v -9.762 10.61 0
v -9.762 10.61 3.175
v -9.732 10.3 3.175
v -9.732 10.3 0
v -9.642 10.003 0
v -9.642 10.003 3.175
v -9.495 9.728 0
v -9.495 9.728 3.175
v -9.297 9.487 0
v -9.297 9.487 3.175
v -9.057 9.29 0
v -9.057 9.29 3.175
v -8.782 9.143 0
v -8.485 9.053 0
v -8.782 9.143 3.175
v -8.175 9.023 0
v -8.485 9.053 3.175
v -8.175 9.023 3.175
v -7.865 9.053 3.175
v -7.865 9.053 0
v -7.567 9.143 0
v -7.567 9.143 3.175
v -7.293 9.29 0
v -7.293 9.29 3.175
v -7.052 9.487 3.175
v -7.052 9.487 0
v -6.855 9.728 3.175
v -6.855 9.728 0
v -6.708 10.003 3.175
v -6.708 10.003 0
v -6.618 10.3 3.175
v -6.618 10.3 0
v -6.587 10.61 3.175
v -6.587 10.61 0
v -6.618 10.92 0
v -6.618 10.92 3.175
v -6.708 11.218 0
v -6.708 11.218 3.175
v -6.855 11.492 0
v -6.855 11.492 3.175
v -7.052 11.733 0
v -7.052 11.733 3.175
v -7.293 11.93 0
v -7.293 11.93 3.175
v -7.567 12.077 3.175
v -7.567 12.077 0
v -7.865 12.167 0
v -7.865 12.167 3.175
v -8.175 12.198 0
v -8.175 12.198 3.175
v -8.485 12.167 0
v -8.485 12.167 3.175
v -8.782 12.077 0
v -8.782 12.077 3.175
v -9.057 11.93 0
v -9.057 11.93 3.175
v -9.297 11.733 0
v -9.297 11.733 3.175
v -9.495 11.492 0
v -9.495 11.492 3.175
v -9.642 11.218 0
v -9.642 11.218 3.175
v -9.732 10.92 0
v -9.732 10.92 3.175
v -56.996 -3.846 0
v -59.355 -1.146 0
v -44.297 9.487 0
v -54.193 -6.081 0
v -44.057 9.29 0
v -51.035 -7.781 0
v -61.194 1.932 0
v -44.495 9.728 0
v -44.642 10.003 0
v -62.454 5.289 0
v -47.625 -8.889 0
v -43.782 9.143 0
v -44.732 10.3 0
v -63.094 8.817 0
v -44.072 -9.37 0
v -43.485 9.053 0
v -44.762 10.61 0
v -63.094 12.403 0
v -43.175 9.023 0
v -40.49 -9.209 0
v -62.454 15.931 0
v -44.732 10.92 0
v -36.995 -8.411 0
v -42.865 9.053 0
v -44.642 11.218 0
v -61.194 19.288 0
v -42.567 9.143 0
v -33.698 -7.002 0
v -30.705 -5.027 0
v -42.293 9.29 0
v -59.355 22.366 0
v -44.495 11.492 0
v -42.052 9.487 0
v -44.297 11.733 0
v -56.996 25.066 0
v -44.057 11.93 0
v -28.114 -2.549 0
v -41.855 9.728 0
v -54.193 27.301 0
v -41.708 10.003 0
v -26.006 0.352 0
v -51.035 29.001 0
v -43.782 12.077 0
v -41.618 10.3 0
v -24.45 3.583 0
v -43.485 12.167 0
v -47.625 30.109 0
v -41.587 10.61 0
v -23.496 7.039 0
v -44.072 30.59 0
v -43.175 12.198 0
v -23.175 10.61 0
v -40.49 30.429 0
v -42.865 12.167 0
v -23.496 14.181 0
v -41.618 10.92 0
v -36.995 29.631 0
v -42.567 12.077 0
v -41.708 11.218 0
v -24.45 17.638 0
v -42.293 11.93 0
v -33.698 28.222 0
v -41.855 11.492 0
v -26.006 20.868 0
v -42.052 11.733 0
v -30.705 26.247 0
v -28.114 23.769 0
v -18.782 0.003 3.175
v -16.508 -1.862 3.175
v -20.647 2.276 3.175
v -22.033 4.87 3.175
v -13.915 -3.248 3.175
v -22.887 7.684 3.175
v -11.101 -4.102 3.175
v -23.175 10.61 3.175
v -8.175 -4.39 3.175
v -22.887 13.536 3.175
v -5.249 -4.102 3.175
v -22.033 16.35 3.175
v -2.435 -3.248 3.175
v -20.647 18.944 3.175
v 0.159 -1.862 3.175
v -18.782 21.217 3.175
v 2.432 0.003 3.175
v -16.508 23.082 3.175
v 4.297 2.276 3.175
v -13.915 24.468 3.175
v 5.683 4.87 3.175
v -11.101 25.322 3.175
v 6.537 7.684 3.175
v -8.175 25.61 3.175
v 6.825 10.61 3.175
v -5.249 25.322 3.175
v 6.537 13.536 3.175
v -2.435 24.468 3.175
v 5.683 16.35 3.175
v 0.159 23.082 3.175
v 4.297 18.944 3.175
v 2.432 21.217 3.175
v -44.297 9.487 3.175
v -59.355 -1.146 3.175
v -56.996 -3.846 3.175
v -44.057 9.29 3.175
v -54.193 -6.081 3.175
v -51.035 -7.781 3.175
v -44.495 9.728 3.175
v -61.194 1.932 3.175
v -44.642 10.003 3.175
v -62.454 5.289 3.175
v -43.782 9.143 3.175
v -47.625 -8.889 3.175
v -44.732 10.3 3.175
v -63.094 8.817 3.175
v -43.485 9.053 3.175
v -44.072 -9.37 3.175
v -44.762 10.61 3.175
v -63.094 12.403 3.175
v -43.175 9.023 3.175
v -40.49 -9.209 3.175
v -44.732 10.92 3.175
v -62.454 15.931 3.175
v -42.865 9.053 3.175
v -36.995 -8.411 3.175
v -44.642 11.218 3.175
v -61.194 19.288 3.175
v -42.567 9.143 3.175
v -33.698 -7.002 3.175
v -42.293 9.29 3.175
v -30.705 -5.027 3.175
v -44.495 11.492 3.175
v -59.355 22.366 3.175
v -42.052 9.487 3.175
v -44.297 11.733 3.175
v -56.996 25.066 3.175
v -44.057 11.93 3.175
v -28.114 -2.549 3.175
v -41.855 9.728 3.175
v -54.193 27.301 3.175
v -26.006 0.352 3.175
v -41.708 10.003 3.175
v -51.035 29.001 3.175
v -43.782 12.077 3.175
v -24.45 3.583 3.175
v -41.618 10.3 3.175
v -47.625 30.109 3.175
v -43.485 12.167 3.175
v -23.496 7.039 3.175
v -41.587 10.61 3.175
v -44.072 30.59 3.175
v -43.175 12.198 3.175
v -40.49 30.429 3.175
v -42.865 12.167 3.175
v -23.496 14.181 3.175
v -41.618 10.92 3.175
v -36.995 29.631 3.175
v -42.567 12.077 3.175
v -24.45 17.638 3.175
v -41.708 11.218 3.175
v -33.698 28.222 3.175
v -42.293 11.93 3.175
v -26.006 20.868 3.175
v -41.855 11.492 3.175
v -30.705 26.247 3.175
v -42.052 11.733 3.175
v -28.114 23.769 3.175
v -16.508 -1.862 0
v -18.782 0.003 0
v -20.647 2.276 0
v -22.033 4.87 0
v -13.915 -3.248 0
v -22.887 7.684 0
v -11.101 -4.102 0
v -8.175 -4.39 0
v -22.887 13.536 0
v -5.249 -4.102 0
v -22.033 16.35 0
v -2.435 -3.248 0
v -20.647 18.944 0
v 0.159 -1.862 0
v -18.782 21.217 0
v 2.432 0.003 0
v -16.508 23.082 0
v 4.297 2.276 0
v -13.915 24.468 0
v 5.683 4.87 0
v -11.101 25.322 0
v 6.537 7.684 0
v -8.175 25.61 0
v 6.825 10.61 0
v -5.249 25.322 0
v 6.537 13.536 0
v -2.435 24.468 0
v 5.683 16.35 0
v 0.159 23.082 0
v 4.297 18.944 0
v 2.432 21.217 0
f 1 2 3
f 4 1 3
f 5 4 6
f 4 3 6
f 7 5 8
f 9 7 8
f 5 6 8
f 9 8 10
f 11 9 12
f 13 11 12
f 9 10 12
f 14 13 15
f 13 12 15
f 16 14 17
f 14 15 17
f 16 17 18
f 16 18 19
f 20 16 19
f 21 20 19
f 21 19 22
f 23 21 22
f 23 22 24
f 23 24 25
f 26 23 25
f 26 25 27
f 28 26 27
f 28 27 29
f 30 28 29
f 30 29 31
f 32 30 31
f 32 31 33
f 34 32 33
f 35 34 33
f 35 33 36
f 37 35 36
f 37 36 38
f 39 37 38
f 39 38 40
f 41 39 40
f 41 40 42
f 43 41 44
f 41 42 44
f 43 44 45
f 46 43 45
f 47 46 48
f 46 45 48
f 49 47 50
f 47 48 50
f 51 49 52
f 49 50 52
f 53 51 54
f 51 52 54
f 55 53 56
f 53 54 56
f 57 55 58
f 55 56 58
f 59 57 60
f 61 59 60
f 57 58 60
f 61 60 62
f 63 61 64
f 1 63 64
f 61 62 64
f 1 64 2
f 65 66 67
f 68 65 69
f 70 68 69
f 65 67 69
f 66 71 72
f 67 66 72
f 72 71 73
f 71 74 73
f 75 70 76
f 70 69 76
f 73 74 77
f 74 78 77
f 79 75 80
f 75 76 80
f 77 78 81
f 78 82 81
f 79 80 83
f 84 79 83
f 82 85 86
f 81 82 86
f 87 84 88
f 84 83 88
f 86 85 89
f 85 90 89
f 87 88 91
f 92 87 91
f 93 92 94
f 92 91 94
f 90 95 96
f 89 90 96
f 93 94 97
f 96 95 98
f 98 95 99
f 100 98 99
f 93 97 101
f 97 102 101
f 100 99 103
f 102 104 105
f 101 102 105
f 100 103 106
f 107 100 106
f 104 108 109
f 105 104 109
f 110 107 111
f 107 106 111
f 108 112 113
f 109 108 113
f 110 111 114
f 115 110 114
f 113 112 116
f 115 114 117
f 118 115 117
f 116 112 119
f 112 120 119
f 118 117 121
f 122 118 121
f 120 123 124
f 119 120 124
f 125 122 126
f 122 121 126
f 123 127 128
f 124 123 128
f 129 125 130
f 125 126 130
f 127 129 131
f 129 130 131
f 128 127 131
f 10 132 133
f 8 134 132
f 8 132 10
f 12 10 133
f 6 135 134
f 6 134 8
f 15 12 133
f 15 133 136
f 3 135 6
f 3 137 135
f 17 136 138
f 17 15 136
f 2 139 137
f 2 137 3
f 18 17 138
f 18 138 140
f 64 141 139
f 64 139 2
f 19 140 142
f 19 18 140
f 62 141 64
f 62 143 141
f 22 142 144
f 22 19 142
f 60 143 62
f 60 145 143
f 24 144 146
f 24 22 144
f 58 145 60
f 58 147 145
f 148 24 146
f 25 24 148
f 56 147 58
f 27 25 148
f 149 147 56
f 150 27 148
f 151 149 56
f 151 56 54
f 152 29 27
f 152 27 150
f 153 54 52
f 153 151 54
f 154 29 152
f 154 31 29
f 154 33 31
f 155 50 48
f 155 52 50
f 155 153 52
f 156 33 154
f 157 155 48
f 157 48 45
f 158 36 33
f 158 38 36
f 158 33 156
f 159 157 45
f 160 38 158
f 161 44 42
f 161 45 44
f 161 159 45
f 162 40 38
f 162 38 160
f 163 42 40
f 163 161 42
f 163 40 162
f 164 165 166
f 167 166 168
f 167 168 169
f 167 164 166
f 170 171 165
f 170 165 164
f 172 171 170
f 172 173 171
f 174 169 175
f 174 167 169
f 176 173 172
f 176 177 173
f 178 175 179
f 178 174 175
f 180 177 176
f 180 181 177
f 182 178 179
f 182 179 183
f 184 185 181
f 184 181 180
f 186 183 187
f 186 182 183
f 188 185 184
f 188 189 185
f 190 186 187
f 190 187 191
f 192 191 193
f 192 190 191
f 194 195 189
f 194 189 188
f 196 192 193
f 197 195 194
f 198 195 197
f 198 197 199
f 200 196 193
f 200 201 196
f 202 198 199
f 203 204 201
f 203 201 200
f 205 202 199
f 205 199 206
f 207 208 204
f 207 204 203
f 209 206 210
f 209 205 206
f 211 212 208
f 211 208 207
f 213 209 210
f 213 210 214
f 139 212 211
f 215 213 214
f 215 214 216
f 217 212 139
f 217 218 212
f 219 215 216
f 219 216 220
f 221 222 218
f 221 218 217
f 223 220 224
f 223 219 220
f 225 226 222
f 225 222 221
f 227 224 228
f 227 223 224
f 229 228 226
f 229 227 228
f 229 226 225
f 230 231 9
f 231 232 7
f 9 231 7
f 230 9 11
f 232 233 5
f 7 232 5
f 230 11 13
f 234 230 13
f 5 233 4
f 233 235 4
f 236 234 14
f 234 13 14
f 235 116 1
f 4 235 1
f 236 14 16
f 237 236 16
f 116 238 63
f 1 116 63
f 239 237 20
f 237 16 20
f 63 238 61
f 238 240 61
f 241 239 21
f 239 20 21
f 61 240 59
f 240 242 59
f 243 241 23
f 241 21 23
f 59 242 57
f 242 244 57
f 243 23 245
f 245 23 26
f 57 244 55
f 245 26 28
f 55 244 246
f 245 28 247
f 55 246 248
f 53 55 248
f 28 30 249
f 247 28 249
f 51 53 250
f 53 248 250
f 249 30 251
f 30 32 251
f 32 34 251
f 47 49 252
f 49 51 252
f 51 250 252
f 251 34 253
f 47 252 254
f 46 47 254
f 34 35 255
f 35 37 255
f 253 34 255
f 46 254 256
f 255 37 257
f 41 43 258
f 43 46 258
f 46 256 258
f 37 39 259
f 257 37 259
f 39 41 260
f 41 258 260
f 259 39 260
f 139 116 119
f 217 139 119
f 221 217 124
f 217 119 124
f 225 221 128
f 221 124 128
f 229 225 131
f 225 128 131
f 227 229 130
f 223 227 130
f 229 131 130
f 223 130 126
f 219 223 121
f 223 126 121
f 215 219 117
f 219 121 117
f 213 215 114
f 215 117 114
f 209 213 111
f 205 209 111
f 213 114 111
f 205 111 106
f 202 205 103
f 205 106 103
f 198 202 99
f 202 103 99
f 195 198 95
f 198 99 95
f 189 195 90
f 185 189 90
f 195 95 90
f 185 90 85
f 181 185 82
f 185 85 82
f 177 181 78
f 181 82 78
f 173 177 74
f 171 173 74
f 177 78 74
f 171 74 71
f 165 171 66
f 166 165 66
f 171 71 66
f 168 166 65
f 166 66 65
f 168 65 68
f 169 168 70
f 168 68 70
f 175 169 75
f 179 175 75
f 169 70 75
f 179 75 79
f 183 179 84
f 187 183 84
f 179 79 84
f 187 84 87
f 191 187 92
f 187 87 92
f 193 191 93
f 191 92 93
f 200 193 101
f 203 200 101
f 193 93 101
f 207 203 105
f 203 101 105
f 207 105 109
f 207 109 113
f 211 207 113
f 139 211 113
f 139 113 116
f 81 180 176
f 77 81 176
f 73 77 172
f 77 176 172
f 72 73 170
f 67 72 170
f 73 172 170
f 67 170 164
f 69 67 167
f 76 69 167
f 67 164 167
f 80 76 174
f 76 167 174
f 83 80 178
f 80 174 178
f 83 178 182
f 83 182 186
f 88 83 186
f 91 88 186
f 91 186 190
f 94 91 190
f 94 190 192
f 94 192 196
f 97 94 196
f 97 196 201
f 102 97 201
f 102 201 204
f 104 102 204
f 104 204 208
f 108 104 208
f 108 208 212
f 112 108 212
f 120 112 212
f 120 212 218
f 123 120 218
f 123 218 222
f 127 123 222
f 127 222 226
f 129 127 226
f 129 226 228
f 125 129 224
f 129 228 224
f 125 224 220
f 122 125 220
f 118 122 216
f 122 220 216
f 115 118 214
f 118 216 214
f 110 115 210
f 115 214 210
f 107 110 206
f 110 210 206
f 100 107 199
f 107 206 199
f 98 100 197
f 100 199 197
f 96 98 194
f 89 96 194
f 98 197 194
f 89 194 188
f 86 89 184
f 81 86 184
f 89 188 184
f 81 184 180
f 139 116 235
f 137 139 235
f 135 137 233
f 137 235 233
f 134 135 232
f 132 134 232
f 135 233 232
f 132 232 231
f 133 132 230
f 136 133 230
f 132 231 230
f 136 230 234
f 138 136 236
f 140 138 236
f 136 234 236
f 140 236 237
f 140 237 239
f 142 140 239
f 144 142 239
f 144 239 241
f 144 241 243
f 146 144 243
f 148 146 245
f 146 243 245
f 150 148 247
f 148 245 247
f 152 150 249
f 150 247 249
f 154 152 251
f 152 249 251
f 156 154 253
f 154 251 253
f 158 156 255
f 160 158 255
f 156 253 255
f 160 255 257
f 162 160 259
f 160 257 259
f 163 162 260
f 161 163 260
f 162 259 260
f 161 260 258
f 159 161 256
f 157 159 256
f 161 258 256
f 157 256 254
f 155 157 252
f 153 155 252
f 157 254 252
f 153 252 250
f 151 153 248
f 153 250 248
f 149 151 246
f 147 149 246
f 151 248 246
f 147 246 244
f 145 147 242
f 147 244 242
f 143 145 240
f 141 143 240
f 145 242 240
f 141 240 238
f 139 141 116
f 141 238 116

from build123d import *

# Parameters (mm, degrees)
F0_R     = 20
F1_DEPTH = 3.175
F2_D     = 3.175
F2_2_D   = 3.175


with BuildPart() as f1:
    # F0 (on Top) → F1 (new body)
    with BuildSketch(Plane.XY):
        with Locations((-43.1749344245, 10.6100216508)):
            Circle(F0_R)
    extrude(amount=F1_DEPTH)

    # F2 (through all)
    with Locations(Plane(origin=(0, 0, 0), x_dir=(1, 0, 0), z_dir=(0, 0, -1))):
        with Locations((-43.1749344245, -10.6100216508), (-8.1749344245, -10.6100216508)):
            Hole(F2_D / 2)


with BuildPart() as f1b:
    # F0 (on Top) → F1, piece 2 (new body)
    with BuildSketch(Plane.XY):
        with BuildLine():
            ThreePointArc((6.8250655755, 10.6100216508), (-8.1749344245, 25.6100216508), (-23.1749344245, 10.6100216508))
            ThreePointArc((-23.1749344245, 10.6100216508), (-8.1749344245, -4.3899783492), (6.8250655755, 10.6100216508))
        make_face()
    extrude(amount=F1_DEPTH)

    # F2#2 (through all)
    with Locations(Plane(origin=(0, 0, 0), x_dir=(1, 0, 0), z_dir=(0, 0, -1))):
        with Locations((-43.1749344245, -10.6100216508), (-8.1749344245, -10.6100216508)):
            Hole(F2_2_D / 2)


solid = Compound([f1.part, f1b.part])
